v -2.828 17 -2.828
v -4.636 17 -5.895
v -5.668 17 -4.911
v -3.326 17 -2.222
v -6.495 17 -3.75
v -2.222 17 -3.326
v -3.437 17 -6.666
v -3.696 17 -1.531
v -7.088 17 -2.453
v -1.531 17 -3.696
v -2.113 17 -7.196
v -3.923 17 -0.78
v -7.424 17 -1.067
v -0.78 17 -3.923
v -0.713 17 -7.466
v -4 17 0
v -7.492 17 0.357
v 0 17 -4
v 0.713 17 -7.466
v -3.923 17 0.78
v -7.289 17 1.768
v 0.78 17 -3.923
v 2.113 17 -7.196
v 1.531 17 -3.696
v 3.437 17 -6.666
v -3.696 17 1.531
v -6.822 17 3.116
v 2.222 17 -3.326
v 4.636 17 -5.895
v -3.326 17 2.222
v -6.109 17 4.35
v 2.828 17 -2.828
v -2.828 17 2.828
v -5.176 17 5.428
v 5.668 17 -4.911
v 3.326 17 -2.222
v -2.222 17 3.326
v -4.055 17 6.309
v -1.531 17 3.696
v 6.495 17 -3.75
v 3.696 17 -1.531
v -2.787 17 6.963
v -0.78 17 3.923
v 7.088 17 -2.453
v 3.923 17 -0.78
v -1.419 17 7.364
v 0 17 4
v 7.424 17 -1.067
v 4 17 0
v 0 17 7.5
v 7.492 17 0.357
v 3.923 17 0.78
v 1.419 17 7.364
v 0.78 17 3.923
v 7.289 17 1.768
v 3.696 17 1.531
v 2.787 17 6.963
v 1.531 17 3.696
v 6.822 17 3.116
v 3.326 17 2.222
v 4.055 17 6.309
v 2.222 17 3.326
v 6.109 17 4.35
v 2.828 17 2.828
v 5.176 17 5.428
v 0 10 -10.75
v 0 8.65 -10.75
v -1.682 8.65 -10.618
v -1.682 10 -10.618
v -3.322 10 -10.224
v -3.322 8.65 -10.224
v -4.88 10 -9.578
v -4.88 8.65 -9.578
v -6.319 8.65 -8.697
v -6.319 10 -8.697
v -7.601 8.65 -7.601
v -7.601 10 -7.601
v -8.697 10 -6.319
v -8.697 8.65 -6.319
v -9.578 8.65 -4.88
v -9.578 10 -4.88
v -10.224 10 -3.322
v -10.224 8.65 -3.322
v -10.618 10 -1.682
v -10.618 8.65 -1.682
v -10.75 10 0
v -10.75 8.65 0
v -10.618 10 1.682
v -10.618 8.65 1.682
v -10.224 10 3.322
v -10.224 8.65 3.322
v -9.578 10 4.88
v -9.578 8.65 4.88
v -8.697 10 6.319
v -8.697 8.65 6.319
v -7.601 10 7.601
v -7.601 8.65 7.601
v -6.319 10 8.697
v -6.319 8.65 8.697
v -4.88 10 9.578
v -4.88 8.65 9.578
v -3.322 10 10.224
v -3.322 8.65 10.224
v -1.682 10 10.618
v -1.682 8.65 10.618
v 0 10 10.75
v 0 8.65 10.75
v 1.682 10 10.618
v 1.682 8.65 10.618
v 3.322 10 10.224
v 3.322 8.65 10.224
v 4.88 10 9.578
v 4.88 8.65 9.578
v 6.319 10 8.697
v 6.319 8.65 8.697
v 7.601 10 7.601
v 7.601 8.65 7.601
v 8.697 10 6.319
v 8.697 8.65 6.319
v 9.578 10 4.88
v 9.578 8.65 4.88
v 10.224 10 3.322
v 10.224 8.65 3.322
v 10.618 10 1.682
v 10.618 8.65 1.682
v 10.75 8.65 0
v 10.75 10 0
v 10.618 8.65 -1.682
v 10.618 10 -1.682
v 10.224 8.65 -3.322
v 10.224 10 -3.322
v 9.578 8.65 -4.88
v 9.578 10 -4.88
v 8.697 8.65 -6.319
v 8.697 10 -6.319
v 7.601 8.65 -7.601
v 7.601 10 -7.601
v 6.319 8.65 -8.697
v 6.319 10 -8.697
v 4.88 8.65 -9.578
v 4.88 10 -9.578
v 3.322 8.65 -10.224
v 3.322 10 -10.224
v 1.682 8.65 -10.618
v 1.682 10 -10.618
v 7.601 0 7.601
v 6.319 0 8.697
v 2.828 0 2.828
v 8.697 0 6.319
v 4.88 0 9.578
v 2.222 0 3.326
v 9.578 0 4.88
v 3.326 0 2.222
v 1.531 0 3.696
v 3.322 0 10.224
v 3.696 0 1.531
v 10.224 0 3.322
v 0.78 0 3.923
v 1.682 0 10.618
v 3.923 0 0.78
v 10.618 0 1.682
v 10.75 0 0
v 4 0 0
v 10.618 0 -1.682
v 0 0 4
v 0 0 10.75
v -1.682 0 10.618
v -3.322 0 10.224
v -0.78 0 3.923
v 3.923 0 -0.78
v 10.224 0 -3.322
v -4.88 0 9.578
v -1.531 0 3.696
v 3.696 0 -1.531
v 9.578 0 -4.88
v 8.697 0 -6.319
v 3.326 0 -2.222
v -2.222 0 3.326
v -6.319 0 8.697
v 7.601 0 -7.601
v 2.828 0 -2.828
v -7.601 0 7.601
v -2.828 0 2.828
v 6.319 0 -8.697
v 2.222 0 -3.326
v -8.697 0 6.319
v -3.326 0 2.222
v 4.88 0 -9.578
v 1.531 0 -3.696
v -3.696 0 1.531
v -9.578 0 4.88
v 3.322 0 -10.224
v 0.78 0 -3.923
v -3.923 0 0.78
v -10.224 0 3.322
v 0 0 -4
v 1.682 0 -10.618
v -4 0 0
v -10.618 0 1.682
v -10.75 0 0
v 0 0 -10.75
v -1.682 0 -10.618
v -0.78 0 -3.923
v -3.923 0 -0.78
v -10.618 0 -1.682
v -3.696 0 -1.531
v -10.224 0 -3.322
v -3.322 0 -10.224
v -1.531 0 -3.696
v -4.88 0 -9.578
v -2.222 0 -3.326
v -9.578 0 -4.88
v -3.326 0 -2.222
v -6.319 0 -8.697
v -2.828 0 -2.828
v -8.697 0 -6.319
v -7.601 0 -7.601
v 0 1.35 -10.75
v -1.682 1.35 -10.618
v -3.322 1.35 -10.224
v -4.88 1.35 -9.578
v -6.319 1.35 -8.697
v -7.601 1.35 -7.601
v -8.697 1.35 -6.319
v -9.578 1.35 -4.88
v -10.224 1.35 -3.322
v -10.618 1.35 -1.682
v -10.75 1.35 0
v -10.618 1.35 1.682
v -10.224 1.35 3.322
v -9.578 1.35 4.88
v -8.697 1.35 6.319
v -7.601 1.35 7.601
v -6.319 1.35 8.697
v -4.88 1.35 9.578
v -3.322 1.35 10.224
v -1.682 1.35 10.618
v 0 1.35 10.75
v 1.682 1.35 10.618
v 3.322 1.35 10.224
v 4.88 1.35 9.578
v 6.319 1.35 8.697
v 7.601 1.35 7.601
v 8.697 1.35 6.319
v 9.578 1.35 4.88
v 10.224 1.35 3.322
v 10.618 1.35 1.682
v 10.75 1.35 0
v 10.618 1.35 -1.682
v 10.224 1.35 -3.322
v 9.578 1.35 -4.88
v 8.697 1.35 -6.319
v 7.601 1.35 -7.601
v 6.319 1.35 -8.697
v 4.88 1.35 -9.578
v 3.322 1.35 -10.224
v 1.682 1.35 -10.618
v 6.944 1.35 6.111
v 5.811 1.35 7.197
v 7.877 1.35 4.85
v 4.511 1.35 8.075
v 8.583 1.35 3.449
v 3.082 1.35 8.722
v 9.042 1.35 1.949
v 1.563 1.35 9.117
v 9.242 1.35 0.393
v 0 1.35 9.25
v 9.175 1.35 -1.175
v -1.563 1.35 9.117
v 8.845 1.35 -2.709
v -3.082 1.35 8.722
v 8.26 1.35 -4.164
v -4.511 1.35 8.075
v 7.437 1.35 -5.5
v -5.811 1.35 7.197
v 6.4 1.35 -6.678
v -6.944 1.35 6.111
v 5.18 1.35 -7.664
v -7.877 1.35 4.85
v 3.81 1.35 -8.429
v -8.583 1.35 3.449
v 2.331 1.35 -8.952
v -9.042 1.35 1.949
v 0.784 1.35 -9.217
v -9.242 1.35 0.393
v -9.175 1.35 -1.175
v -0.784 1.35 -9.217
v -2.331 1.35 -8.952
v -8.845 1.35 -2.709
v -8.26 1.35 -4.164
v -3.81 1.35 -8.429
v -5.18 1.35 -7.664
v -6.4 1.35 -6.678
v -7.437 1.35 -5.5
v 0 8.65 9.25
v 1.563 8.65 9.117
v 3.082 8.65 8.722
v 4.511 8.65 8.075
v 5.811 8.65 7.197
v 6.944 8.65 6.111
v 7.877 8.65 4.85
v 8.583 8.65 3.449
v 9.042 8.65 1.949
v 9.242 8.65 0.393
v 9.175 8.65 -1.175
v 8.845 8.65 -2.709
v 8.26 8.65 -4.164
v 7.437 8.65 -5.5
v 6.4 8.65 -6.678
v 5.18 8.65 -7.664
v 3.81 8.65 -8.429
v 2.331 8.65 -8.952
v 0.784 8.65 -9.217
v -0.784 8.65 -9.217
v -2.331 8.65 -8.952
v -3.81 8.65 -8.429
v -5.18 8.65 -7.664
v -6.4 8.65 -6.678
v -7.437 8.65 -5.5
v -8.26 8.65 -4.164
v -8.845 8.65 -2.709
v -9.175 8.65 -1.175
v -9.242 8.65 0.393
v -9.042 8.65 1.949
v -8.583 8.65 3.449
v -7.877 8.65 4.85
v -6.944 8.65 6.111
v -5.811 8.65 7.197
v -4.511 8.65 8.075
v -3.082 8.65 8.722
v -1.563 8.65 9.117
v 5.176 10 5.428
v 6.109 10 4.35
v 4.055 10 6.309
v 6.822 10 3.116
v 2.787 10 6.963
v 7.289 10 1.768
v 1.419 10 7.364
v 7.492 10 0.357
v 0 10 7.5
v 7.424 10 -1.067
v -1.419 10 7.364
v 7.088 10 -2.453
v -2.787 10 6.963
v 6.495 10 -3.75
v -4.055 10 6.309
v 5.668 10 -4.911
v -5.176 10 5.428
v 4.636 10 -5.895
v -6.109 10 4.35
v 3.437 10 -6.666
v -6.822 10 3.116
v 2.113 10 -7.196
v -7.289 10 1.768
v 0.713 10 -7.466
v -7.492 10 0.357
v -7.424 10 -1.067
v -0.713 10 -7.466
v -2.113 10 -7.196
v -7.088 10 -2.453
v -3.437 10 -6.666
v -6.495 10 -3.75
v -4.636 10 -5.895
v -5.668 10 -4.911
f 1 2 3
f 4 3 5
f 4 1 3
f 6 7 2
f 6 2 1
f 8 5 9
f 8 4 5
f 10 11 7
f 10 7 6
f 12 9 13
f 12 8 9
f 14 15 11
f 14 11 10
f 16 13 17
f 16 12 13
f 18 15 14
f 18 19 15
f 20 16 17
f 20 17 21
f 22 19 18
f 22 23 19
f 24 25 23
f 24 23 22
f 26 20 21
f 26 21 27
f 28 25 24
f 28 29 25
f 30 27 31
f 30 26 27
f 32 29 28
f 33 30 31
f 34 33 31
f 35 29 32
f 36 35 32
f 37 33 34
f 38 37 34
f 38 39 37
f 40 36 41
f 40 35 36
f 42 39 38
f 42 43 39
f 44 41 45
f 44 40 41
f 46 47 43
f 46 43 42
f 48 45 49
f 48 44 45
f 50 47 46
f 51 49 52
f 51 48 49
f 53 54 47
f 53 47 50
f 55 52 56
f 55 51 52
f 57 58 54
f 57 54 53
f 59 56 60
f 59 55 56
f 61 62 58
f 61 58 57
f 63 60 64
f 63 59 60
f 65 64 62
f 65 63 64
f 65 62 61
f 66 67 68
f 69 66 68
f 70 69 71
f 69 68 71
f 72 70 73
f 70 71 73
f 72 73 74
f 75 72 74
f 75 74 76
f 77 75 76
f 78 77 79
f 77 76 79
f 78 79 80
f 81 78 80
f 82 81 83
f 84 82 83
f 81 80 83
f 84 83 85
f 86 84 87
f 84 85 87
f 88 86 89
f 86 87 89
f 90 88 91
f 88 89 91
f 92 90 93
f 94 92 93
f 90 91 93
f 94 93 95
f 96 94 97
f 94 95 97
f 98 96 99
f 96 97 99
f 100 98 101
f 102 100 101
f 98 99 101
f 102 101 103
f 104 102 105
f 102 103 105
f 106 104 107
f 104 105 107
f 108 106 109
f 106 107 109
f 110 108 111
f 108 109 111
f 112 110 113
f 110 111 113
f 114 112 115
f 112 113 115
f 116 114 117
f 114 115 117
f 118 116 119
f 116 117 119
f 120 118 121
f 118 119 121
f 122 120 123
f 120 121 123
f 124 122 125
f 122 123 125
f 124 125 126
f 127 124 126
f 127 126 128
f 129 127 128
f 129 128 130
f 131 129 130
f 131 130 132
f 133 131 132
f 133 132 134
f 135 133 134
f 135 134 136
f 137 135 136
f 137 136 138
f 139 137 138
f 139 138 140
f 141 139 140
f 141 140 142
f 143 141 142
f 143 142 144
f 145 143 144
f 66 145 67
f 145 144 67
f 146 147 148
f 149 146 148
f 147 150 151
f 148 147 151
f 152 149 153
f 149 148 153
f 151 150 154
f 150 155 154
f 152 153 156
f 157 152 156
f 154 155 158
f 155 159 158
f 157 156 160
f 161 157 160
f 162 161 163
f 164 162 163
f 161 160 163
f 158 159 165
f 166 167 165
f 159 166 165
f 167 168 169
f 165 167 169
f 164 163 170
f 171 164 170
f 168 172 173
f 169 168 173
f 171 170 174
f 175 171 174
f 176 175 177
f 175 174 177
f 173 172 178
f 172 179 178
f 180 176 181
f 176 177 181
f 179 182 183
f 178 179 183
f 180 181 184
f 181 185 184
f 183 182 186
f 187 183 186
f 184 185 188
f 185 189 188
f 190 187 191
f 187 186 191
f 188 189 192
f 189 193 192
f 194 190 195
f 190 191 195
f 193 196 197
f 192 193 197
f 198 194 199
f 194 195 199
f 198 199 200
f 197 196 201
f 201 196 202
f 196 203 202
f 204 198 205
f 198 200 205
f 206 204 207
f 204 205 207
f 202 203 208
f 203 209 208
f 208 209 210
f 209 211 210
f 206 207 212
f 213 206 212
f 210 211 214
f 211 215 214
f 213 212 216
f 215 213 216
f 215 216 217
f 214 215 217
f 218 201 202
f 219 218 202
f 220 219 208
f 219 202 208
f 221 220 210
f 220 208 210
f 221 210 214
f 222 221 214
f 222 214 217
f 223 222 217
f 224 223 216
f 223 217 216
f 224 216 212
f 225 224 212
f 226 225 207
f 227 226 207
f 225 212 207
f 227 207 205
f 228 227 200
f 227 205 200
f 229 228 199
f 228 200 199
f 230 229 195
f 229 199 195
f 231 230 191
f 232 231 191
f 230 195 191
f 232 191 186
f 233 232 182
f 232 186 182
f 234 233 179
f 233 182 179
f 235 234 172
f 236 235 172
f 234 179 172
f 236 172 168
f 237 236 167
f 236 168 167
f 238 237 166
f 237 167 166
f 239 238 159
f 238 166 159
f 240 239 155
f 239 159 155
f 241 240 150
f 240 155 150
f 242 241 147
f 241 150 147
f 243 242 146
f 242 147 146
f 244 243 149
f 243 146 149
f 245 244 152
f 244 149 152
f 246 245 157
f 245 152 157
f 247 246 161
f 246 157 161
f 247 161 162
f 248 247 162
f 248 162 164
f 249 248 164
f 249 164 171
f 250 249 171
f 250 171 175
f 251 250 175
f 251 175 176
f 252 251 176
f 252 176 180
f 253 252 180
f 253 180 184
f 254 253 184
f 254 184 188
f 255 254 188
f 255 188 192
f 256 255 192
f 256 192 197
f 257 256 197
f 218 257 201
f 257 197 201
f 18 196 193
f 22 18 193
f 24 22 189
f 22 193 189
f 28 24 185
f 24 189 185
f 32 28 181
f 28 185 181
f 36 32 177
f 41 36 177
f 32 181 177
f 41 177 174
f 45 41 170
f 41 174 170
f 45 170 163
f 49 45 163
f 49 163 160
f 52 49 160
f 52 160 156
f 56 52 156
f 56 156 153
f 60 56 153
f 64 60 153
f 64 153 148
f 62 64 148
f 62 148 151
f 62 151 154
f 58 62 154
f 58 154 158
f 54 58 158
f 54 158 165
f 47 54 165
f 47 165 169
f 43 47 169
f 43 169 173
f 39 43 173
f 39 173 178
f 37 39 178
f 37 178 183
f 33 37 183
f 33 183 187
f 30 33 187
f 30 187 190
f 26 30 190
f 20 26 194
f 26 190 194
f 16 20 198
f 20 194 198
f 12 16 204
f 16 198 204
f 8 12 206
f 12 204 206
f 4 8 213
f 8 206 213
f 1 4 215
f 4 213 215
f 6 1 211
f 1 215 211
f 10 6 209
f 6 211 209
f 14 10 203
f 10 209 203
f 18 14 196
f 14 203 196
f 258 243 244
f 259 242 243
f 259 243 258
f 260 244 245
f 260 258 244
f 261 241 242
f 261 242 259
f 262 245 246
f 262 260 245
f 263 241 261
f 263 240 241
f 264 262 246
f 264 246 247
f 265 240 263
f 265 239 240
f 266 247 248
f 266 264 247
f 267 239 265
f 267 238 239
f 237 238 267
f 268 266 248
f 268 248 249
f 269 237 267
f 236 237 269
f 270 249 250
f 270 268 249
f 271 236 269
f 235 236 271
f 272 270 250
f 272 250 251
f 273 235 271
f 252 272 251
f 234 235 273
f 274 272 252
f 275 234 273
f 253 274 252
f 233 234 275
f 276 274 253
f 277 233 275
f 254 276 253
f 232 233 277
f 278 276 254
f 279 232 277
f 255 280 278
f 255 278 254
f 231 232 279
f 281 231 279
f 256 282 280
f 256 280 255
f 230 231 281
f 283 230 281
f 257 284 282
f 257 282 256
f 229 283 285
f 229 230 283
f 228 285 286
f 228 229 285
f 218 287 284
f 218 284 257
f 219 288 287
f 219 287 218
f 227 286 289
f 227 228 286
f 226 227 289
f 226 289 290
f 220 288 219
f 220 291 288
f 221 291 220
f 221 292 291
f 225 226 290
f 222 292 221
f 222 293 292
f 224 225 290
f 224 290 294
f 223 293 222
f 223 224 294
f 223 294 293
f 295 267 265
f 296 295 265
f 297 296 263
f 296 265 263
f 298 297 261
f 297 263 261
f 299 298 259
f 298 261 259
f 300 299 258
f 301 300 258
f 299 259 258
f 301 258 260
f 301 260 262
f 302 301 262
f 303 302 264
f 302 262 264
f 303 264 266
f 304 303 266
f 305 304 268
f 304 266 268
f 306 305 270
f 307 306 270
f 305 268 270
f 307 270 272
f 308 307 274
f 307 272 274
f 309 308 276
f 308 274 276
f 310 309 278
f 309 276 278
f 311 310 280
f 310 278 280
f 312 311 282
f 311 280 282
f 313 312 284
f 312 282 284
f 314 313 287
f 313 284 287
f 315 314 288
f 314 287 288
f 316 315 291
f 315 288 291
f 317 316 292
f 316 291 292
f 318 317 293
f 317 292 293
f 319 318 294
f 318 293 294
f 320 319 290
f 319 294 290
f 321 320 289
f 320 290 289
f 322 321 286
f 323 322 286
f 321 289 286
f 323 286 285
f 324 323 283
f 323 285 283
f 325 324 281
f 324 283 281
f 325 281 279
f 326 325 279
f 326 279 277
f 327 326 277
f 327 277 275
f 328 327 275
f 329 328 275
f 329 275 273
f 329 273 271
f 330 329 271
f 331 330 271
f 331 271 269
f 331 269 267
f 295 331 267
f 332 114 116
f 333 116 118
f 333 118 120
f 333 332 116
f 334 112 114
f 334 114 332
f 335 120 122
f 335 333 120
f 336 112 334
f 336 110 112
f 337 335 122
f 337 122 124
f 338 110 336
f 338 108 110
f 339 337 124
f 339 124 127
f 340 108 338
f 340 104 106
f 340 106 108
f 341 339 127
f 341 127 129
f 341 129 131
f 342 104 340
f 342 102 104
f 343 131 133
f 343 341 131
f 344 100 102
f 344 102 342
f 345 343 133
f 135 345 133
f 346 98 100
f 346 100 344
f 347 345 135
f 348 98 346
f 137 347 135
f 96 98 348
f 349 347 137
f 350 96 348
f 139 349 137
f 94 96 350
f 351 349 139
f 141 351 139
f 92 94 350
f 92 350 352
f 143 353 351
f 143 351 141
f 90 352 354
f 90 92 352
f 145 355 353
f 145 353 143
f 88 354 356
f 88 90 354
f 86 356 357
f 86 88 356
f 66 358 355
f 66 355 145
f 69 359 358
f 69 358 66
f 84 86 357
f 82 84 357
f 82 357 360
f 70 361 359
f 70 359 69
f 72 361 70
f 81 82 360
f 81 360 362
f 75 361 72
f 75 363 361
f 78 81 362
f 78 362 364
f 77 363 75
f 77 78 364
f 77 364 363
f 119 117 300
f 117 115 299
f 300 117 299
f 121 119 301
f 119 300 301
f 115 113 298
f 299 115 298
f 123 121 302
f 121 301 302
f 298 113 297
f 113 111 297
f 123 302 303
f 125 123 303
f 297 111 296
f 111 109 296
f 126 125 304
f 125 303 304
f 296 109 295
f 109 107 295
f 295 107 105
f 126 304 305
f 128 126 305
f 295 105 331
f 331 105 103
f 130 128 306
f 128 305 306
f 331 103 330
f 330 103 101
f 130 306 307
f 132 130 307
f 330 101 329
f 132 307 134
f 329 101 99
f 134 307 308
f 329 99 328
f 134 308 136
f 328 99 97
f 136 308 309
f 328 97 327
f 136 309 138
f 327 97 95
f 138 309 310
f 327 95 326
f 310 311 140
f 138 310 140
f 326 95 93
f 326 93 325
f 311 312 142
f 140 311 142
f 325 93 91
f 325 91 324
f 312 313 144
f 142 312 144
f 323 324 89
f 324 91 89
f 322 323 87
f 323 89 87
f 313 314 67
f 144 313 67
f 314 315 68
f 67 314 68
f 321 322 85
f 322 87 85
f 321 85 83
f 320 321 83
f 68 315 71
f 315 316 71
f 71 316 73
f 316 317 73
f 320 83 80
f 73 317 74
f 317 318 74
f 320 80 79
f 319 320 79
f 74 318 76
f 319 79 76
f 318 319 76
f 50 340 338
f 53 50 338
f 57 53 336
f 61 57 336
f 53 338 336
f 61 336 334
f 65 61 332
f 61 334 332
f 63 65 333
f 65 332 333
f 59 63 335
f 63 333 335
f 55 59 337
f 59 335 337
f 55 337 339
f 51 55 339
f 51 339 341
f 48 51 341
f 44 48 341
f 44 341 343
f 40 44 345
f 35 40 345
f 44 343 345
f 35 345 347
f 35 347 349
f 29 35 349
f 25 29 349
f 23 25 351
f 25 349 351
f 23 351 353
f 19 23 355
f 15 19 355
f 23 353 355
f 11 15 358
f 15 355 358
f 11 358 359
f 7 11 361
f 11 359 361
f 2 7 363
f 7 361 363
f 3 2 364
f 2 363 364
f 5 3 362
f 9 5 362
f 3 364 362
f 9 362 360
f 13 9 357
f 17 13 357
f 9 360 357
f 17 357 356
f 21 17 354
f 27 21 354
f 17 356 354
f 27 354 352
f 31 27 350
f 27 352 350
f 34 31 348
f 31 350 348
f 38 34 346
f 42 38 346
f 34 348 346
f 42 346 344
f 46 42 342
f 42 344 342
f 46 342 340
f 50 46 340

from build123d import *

# Parameters (mm, degrees)
SKETCH_1_R          = 10.75
EXTRUDE_1_DEPTH     = 1.35
SKETCH_4_R          = 9.25
EXTRUDE_3_DEPTH     = 7.3
EXTRUDE_START       = 8.65
SKETCH_1_4_R        = 10.75
EXTRUDE_4_DEPTH     = 1.35
SKETCH_6_R          = 7.5
EXTRUDE_5_DEPTH     = 7
SKETCH_5_R          = 4
CUT_EXTRUDE_1_DEPTH = 23.806249144


with BuildPart() as part:
    # 草图1 → 凸台-拉伸1 (new body)
    with BuildSketch(Plane(origin=(0, 0, 0), x_dir=(1, 0, 0), z_dir=(0, 1, 0))):
        with Locations(Location((0, 0, 0), (0, 0, 90))):
            Circle(SKETCH_1_R)
    extrude(amount=EXTRUDE_1_DEPTH)

    # 草图4 → 凸台-拉伸3 (add)
    with BuildSketch(Plane(origin=(0, 1.35, 0), x_dir=(1, 0, 0), z_dir=(0, 1, 0))):
        with Locations(Location((0, 0, 0), (0, 0, 270))):
            Circle(SKETCH_4_R)
    extrude(amount=EXTRUDE_3_DEPTH)

    # 草图1<4> → 凸台-拉伸4 (add)
    with BuildSketch(Plane(origin=(0, 0, 0), x_dir=(1, 0, 0), z_dir=(0, 1, 0)).offset(EXTRUDE_START)):
        with Locations(Location((0, 0, 0), (0, 0, 90))):
            Circle(SKETCH_1_4_R)
    extrude(amount=EXTRUDE_4_DEPTH)

    # 草图6 → 凸台-拉伸5 (add)
    with BuildSketch(Plane(origin=(0, 10, 0), x_dir=(1, 0, 0), z_dir=(0, 1, 0))):
        with Locations(Location((0, 0, 0), (0, 0, 270))):
            Circle(SKETCH_6_R)
    extrude(amount=EXTRUDE_5_DEPTH)

    # 草图5 → 切除-拉伸1 (cut, through all)
    with BuildSketch(Plane.XZ):
        with Locations(Location((0, 0, 0), (0, 0, 270))):
            Circle(SKETCH_5_R)
    extrude(amount=-CUT_EXTRUDE_1_DEPTH, mode=Mode.SUBTRACT)


solid = part.part
